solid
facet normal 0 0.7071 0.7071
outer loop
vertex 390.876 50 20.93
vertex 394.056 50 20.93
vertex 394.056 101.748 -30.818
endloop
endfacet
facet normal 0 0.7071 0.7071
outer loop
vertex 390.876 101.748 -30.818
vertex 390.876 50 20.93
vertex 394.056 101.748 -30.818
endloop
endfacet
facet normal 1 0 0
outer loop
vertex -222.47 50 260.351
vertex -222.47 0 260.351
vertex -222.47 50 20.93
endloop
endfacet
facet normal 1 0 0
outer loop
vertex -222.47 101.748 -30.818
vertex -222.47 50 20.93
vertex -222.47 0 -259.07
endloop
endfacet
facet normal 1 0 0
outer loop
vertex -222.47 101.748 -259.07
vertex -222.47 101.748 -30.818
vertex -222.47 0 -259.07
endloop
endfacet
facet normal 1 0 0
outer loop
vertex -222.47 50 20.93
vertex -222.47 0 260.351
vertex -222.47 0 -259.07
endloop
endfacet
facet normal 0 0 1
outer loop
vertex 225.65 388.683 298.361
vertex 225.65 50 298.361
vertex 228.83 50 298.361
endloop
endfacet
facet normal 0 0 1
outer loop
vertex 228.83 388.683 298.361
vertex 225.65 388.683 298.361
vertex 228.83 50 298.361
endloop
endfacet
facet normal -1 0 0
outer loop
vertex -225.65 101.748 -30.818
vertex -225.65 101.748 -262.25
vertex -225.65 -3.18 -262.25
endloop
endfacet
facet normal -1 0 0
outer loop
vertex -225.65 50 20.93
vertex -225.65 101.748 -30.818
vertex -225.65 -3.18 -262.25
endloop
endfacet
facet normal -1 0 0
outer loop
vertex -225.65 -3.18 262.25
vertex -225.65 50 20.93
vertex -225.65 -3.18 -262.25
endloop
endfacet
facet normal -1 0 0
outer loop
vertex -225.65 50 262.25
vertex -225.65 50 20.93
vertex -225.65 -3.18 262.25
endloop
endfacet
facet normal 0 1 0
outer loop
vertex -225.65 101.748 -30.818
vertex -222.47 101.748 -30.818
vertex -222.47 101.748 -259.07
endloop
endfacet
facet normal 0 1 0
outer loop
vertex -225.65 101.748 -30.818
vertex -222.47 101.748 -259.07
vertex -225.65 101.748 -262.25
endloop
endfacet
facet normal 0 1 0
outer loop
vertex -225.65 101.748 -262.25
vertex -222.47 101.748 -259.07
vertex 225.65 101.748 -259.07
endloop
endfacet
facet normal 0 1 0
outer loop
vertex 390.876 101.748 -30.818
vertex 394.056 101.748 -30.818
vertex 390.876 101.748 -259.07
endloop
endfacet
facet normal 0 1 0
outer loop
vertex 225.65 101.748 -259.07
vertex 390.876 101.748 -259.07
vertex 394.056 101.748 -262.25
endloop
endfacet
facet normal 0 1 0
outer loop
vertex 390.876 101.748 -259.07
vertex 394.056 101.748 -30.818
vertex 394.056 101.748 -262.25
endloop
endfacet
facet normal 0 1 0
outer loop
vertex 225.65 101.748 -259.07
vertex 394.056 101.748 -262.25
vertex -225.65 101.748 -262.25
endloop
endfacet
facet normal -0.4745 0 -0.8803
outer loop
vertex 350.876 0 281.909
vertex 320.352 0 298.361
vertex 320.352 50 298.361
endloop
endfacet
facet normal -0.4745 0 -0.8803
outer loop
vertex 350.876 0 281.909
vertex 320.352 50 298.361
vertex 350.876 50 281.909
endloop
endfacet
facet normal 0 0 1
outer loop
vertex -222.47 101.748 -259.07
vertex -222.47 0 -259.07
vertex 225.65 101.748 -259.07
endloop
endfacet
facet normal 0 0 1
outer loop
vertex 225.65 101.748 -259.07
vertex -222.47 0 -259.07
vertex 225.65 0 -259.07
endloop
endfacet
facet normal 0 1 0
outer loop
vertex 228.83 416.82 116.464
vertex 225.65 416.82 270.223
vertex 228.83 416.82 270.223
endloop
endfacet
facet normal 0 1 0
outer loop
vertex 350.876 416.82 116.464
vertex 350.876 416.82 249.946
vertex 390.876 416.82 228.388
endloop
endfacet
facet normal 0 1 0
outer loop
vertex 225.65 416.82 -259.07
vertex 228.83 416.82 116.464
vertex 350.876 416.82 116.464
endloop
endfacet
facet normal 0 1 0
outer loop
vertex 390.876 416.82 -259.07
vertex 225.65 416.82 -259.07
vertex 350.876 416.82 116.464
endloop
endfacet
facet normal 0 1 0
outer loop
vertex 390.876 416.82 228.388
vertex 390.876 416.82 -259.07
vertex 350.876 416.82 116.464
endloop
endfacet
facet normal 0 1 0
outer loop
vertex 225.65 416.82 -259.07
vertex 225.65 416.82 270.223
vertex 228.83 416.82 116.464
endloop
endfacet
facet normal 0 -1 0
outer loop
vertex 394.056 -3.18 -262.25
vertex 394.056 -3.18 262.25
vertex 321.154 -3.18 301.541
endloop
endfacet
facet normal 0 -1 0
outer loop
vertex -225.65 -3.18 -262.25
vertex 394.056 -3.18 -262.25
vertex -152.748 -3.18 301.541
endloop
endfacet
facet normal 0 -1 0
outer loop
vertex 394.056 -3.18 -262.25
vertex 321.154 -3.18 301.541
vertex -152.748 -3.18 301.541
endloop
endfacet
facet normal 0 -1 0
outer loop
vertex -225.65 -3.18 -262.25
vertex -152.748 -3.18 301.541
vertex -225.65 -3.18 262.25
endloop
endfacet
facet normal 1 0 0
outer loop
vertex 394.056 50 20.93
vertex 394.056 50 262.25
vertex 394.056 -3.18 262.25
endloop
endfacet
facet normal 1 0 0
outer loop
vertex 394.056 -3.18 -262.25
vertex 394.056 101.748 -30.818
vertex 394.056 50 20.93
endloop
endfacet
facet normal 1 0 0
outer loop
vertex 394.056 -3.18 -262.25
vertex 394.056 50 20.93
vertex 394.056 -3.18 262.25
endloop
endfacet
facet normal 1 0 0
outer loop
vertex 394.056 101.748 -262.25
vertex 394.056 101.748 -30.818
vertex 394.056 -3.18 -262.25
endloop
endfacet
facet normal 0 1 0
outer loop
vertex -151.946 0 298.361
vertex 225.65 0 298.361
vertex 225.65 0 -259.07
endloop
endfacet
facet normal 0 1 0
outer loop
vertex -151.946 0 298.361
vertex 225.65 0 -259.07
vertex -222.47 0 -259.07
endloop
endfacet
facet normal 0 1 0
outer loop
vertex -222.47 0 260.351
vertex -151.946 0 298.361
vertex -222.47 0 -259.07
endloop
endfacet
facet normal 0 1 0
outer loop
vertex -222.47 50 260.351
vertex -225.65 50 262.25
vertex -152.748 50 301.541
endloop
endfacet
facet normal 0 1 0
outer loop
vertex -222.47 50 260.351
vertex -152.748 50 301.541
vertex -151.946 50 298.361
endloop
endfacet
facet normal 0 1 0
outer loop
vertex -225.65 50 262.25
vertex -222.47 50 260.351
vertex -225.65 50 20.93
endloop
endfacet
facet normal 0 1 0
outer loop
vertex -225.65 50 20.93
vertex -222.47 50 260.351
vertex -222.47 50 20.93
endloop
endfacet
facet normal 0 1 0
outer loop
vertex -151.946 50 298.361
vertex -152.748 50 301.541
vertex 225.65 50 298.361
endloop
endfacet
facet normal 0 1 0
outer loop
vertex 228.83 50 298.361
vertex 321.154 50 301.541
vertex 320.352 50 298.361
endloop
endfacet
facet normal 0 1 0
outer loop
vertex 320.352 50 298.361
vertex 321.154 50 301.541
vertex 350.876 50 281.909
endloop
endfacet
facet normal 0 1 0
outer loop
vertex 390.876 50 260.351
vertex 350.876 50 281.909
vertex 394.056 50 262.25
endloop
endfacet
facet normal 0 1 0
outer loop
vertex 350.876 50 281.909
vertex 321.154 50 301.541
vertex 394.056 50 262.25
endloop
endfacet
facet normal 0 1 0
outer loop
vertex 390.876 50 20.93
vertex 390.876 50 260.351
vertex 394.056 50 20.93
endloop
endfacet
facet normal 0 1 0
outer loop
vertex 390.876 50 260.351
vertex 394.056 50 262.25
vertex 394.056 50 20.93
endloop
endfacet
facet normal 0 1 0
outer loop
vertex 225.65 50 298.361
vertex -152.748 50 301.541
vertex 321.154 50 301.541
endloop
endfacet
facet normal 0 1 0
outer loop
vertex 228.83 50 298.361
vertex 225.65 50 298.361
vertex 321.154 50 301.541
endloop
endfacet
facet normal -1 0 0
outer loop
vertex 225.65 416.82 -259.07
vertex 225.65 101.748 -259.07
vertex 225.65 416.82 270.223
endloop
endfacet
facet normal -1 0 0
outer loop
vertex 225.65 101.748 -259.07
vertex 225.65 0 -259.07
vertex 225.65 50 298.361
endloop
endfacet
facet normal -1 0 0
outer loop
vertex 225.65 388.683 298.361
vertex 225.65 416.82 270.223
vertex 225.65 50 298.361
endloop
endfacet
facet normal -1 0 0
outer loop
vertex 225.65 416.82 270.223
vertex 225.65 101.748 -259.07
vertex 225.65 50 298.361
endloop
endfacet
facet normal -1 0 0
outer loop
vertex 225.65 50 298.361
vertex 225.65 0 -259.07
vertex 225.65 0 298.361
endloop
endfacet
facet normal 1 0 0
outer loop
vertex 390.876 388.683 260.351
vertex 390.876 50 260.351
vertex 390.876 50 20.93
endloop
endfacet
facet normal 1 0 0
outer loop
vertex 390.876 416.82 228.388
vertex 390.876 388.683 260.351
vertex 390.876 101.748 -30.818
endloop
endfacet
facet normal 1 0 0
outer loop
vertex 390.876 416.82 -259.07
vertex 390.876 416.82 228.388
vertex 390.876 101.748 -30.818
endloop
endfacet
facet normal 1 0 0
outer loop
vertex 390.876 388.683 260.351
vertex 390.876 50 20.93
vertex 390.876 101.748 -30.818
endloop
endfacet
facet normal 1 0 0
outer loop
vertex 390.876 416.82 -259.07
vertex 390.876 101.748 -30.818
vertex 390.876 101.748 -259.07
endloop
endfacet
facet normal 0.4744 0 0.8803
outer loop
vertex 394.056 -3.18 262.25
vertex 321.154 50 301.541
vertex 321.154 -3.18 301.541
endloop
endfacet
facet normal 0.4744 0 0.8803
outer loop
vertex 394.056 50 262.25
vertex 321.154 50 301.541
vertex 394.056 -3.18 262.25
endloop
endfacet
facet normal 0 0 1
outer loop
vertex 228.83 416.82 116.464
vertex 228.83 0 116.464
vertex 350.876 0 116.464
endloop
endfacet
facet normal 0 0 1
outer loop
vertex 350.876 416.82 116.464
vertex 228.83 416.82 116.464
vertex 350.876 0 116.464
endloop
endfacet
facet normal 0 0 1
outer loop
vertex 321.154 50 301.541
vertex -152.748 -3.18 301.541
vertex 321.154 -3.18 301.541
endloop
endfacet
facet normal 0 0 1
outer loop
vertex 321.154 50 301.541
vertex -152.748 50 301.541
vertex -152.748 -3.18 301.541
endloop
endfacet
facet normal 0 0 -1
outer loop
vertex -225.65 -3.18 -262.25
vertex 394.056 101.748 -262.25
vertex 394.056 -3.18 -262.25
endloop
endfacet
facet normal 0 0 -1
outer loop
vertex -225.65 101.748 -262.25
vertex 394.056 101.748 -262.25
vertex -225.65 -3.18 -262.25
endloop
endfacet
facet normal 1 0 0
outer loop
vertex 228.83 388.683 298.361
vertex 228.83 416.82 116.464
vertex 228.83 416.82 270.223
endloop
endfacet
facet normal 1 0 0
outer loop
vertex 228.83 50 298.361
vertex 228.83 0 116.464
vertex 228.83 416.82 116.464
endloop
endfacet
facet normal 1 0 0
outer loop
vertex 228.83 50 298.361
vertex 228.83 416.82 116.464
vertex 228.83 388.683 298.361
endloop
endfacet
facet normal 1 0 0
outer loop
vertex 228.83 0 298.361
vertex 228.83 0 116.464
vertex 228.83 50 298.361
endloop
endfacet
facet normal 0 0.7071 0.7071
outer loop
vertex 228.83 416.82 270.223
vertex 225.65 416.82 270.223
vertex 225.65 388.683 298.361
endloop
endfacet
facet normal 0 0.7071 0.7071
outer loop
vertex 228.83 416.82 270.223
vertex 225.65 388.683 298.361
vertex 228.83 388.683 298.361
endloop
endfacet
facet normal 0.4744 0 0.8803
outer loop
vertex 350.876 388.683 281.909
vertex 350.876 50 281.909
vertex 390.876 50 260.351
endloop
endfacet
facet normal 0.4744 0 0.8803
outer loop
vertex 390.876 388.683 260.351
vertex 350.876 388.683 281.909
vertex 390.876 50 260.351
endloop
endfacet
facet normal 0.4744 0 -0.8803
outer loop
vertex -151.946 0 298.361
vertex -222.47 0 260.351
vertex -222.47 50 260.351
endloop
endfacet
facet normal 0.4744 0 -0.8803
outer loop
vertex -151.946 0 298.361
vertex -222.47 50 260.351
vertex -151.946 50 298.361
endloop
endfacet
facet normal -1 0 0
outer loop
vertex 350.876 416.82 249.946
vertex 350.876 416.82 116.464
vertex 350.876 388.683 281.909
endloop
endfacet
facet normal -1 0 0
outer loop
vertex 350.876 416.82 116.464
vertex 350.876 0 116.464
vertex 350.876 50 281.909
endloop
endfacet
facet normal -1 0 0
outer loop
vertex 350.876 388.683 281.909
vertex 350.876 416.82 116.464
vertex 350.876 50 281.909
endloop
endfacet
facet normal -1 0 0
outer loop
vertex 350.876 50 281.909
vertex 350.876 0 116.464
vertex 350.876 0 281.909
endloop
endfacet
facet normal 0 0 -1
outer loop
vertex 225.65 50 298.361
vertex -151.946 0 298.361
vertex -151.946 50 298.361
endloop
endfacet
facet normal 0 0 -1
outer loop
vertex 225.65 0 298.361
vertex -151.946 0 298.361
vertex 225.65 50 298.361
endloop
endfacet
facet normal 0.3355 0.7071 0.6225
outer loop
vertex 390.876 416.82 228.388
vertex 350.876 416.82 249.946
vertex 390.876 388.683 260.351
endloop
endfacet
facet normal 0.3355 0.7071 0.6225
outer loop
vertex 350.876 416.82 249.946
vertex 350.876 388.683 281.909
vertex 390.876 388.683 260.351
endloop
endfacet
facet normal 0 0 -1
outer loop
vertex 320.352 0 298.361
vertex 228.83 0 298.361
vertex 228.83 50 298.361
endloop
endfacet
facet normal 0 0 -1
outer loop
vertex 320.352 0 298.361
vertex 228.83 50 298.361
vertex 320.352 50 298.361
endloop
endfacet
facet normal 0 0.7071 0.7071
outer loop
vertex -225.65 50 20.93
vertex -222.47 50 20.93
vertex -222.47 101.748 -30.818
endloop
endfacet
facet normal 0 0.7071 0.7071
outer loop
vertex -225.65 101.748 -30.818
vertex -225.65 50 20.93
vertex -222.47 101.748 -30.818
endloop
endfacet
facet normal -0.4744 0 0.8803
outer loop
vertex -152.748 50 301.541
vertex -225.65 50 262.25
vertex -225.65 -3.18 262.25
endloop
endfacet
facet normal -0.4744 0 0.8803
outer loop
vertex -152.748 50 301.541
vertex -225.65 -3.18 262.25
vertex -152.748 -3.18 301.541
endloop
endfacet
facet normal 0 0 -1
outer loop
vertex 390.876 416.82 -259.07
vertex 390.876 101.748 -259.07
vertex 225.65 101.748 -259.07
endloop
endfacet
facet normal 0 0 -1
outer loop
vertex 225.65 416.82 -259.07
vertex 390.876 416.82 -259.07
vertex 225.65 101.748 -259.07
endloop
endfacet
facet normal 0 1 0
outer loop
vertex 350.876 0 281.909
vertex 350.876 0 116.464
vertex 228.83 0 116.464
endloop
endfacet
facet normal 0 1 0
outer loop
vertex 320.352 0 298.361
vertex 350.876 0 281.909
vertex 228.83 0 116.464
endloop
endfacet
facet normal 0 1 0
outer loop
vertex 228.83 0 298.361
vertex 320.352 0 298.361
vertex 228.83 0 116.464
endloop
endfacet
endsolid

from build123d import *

# Parameters (mm, degrees)
BOSS_EXTRUDE3_DEPTH    = 370
SKETCH3_W              = 619.706220458
SKETCH3_H              = 524.5
BOSS_EXTRUDE4_DEPTH    = 50
BOSS_EXTRUDE6_DEPTH    = 420
CHAMFER1_SIZE          = 30
SHELL1_T               = -3.18
CUT_EXTRUDE1_DEPTH     = 10
BOSS_EXTRUDE7_REACH    = 652.082
SKETCH13_W             = 122.046220458
SKETCH13_H             = 233.985108613
CUT_EXTRUDE3_DEPTH     = 651.08233795
SPLIT2_SURFACE_1_BACK  = 938.174
SPLIT2_SURFACE_1_DEPTH = 1876.348
BOSS_EXTRUDE8_DEPTH    = 3.18


with BuildPart() as part:
    # Sketch1 → Boss-Extrude3 (new body)
    with BuildSketch(Plane(origin=(0, 0, 0), x_dir=(1, 0, 0), z_dir=(0, 1, 0))):
        Polygon((225.65, -262.25), (394.056220458, -262.25), (394.056220458, 262.25), (225.65, 262.25), (-225.65, 262.25), (-225.65, -262.25), align=None)
    extrude(amount=BOSS_EXTRUDE3_DEPTH)

    # Sketch3 → Boss-Extrude4 (add)
    with BuildSketch(Plane(origin=(0, 370, 0), x_dir=(1, 0, 0), z_dir=(0, 1, 0))):
        with Locations((84.203110229, 0)):
            Rectangle(SKETCH3_W, SKETCH3_H)
    extrude(amount=BOSS_EXTRUDE4_DEPTH)

    # Sketch9 → Boss-Extrude6 (add)
    with BuildSketch(Plane(origin=(0, 0, 0), x_dir=(1, 0, 0), z_dir=(0, 1, 0))):
        Polygon((-225.65, -262.25), (-152.747945688, -301.540612909), (321.154166146, -301.540612909), (394.056220458, -262.25), align=None)
    extrude(amount=BOSS_EXTRUDE6_DEPTH)

    # Chamfer1
    chamfer1_edges = [part.edges().sort_by_distance(p)[0] for p in [
        (-189.198972844, 420, 281.895306454),
        (84.203110229, 420, 301.540612909),
        (357.605193302, 420, 281.895306454),
    ]]
    chamfer(chamfer1_edges, length=CHAMFER1_SIZE)

    # Shell1
    shell1_openings = [part.faces().sort_by_distance(p)[0] for p in [
        (84.203110229, 0, 17.423394881),
    ]]
    offset(amount=SHELL1_T, openings=shell1_openings, kind=Kind.INTERSECTION)

    # Sketch7 → Cut-Extrude1 (cut)
    with BuildSketch(Plane.ZY.offset(225.65)):
        Polygon((-19.07, 315), (-19.07, 230), (20.93, 190), (80.93, 190), (120.93, 230), (120.93, 315), align=None)
    extrude(amount=-CUT_EXTRUDE1_DEPTH, mode=Mode.SUBTRACT)


with BuildPart() as body_2:

    # Sketch12 → Boss-Extrude7 (new, up to next)
    with BuildSketch(Plane(origin=(0, 0, 0), x_dir=(1, 0, 0), z_dir=(0, 1, 0)), mode=Mode.PRIVATE) as boss_extrude7_sk1:
        Polygon((225.65, -262.25), (225.65, -298.360612909), (320.351791074, -298.360612909), (390.876220458, -260.35142261), (390.876220458, 259.07), (225.65, 259.07), align=None)
    boss_extrude7_tool1 = extrude(boss_extrude7_sk1.sketch, amount=BOSS_EXTRUDE7_REACH, mode=Mode.PRIVATE) - part.part
    add(boss_extrude7_tool1.solids().sort_by_distance((307.390302, 0, 15.716589))[0])

    # Sketch13 → Cut-Extrude3 (cut, through all)
    with BuildSketch(Plane.XZ):
        with Locations((289.853110229, 233.456942929)):
            Rectangle(SKETCH13_W, SKETCH13_H)
    extrude(amount=-CUT_EXTRUDE3_DEPTH, mode=Mode.SUBTRACT)


with BuildPart() as part_1:
    add(part.part)

    # Split2: cut with a surface, the side it looks to stays
    # Split2 surface: a surface, the sketch's curves swept straight by 1876.348 mm
    with BuildLine(Plane.ZY.offset(225.65).offset(-SPLIT2_SURFACE_1_BACK), mode=Mode.PRIVATE) as split2_surface_1_path:
        Line((377.982656301, 50), (20.93, 50))
        Line((20.93, 50), (-30.817816509, 101.747816509))
        Line((-30.817816509, 101.747816509), (-303.707153017, 101.747816509))
    split2_surface_1 = Shell.extrude(split2_surface_1_path.wire(), (-1 * SPLIT2_SURFACE_1_DEPTH, 0 * SPLIT2_SURFACE_1_DEPTH, 0 * SPLIT2_SURFACE_1_DEPTH))
    split(bisect_by=split2_surface_1, keep=Keep.TOP)

    add(body_2.part)  # Boss-Extrude8 merges body 2
    # Sketch14 → Boss-Extrude8 (add)
    with BuildSketch(Plane.XZ):
        Polygon((394.056220458, 262.25), (394.056220458, -262.25), (-225.65, -262.25), (-225.65, 262.25), (-152.747945688, 301.540612909), (321.154166146, 301.540612909), align=None)
    extrude(amount=BOSS_EXTRUDE8_DEPTH)


solid = part_1.part
